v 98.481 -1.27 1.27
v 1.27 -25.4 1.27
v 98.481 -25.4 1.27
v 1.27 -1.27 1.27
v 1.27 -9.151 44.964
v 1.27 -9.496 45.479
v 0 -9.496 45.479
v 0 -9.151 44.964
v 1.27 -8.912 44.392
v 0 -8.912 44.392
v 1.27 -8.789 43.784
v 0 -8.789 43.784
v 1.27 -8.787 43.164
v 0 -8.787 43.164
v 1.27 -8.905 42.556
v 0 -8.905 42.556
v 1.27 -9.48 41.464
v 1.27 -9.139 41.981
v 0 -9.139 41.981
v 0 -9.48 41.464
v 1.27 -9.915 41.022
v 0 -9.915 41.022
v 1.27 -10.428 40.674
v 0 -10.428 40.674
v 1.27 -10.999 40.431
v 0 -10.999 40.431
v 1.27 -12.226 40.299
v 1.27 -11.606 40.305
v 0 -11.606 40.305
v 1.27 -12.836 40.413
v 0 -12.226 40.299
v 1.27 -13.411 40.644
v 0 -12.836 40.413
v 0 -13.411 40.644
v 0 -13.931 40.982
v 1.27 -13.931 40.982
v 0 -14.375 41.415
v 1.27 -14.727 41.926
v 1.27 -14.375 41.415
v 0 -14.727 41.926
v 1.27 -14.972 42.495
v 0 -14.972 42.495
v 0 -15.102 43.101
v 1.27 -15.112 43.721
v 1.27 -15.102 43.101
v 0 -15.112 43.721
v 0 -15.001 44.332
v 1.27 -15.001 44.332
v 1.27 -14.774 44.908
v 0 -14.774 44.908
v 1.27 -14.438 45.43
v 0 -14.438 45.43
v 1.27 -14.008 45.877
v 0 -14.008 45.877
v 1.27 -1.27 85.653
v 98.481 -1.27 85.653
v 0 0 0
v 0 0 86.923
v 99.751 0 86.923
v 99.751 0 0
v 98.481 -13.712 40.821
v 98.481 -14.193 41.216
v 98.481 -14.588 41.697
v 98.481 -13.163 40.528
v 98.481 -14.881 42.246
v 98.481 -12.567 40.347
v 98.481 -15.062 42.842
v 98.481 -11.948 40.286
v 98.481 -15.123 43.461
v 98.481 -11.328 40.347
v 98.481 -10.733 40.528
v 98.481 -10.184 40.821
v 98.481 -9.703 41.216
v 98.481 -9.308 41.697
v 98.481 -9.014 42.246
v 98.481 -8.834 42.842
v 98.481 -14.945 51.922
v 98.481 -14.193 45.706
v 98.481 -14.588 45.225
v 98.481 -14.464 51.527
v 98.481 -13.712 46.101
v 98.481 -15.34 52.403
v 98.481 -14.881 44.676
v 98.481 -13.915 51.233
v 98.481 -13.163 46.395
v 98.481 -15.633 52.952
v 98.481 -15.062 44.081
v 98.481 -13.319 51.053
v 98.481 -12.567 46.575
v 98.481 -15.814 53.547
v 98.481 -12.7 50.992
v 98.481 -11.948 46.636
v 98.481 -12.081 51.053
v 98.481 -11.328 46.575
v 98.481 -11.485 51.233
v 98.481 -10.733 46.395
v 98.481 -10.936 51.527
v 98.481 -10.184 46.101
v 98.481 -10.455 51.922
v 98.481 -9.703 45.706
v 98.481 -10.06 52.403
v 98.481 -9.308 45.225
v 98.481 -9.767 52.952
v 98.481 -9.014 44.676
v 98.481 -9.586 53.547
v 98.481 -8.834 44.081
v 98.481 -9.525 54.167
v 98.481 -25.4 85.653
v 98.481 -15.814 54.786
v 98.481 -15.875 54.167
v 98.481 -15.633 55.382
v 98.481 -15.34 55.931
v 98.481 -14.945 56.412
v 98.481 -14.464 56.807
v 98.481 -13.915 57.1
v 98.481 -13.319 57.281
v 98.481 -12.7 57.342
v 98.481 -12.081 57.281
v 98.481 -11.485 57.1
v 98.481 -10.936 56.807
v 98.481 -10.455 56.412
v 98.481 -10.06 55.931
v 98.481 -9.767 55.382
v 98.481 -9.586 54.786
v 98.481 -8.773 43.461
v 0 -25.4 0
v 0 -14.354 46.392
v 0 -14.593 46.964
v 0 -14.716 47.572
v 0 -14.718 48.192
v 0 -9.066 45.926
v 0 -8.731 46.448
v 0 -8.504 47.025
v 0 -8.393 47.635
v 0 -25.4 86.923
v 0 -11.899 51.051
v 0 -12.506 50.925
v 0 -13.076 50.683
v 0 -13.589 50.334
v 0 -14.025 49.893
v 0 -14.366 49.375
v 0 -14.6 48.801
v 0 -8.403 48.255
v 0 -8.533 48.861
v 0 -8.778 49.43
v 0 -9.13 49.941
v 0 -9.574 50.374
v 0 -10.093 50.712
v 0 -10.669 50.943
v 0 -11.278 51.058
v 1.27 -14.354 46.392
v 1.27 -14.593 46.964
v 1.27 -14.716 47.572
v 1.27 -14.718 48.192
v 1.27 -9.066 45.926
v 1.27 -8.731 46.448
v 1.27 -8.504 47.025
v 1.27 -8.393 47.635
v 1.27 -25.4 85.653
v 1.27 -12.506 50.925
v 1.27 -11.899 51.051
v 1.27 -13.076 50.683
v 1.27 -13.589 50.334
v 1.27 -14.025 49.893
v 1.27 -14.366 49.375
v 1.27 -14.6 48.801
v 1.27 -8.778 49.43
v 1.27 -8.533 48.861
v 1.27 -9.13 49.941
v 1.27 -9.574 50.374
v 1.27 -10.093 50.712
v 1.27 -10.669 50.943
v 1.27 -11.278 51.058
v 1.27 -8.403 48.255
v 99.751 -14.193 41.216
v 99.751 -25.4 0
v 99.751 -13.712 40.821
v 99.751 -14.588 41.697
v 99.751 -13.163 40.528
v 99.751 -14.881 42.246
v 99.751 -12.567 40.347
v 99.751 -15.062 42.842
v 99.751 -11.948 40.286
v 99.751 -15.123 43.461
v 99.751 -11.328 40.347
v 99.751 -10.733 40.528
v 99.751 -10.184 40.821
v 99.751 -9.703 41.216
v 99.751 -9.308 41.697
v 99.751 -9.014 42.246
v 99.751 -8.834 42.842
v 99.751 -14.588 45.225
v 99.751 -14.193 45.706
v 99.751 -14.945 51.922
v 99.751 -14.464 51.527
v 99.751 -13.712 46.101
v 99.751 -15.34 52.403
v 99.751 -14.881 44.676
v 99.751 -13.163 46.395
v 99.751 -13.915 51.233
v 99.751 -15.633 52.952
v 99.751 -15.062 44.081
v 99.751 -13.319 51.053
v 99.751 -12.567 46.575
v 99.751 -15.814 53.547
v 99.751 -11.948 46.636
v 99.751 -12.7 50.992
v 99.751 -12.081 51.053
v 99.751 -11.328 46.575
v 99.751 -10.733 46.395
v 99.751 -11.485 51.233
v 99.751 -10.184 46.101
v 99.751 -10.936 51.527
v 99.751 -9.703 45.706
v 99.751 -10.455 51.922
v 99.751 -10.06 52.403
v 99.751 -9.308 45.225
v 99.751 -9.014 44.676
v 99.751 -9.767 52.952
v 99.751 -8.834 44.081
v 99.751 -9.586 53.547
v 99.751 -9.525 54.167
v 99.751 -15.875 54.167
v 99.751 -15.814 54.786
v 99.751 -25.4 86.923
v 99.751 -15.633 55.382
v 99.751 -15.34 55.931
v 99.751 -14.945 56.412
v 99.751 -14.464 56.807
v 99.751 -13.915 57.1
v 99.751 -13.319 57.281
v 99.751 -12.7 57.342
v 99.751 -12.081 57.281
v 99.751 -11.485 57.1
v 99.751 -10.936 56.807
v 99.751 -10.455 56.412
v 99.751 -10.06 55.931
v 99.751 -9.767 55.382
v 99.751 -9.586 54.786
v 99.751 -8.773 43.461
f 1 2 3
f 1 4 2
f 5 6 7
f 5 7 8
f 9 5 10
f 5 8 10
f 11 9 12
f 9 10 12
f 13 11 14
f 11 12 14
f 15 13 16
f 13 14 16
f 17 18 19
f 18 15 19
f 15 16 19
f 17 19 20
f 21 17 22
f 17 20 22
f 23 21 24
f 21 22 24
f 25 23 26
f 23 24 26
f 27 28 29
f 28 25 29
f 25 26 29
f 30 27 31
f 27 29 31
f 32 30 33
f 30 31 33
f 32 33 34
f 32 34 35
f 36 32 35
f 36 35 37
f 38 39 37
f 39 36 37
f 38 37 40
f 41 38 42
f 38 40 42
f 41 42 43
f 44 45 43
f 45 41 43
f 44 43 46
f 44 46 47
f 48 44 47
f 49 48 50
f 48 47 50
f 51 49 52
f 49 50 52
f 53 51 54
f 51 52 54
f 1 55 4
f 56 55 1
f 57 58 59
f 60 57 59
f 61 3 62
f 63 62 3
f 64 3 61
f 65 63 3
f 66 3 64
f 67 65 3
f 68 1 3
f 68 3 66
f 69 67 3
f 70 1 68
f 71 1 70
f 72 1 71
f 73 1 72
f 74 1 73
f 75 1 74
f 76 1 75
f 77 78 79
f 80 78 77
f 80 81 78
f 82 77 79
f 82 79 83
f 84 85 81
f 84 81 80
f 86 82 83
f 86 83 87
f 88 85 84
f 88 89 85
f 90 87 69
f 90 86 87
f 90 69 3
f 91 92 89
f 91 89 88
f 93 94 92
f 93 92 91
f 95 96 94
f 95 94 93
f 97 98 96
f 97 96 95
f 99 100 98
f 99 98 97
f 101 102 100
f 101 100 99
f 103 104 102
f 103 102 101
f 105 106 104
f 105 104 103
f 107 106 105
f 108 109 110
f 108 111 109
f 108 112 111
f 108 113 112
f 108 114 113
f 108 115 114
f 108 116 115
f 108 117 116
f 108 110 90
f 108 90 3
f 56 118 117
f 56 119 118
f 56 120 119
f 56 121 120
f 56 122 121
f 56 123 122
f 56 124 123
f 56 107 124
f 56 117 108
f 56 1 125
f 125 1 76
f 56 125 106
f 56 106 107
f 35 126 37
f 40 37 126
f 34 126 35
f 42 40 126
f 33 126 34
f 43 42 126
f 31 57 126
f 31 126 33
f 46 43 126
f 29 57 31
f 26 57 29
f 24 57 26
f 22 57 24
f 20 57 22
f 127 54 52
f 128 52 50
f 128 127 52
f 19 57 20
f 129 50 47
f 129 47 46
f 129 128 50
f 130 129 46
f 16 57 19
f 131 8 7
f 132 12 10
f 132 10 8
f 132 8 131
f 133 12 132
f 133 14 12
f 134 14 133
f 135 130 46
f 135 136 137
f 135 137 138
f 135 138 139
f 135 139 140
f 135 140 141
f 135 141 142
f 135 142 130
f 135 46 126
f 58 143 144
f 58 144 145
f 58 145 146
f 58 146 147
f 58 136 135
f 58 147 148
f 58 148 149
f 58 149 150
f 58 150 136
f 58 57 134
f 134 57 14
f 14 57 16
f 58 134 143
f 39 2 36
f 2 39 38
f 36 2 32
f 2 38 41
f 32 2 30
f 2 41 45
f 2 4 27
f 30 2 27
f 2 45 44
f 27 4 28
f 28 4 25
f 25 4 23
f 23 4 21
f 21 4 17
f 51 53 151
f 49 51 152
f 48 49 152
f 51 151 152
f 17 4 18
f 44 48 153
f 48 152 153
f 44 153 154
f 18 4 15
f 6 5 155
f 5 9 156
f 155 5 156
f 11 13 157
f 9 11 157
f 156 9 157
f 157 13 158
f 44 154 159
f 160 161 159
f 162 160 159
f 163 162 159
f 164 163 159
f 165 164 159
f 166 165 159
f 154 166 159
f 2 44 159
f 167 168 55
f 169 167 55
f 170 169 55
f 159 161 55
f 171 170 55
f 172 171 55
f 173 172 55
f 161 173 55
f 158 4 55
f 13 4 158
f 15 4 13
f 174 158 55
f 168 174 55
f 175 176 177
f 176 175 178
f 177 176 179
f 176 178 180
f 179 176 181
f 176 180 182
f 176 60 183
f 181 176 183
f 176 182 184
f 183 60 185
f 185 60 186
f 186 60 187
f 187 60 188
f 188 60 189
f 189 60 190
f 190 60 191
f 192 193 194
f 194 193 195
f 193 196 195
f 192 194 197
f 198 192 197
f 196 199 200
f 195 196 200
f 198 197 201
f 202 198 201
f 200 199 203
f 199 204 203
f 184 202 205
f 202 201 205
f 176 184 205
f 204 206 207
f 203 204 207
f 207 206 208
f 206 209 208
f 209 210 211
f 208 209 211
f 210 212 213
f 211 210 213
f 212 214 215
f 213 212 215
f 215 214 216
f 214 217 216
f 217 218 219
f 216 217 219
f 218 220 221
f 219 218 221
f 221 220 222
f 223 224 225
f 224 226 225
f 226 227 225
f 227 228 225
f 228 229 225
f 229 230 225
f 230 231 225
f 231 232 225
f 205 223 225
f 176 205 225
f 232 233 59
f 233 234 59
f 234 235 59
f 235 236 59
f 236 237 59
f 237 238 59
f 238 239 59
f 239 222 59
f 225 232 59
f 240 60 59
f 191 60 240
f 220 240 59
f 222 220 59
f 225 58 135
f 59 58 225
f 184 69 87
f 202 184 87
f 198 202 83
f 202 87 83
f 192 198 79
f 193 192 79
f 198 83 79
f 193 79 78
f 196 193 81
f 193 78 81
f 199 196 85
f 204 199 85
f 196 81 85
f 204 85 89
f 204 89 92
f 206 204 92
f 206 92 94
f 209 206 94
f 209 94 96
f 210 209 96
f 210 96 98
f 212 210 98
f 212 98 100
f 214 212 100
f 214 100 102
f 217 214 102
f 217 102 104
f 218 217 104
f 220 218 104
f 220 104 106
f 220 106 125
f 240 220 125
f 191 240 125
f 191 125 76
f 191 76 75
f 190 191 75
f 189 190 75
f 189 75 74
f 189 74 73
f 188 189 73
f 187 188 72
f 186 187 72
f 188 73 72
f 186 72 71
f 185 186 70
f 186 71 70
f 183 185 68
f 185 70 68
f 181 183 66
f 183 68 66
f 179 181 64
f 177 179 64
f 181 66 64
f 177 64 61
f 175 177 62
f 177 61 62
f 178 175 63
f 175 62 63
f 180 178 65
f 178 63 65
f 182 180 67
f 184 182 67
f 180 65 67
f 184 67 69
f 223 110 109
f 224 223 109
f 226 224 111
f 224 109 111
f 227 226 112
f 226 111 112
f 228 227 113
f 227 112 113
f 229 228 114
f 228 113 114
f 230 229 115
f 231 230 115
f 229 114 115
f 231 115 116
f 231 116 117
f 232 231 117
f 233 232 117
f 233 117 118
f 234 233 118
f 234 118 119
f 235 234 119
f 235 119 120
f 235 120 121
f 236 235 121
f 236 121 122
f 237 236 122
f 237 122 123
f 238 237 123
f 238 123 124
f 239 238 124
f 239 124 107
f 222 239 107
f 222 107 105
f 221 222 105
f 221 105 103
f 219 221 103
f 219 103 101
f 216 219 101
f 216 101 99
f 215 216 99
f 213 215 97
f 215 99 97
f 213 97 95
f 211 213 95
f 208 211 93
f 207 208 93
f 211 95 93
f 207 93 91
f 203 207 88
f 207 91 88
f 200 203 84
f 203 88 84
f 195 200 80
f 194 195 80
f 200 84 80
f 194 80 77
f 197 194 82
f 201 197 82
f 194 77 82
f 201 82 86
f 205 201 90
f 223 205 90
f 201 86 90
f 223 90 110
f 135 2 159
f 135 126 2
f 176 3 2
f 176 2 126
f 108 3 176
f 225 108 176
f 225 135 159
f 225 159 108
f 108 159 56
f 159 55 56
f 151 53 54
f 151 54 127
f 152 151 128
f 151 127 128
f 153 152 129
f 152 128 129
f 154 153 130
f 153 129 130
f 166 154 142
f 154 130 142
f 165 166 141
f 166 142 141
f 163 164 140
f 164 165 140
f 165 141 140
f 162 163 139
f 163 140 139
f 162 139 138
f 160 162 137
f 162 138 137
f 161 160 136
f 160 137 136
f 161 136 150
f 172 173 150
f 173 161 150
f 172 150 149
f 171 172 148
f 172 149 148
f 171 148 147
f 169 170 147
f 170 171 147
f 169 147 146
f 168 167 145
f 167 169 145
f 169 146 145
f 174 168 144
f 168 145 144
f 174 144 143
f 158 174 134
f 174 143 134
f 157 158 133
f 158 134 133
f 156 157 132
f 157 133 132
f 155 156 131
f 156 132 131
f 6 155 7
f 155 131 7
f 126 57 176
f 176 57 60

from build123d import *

# Parameters (mm, degrees)
F0_W     = 99.75113
F0_H     = 86.922713
F1_DEPTH = 25.4
F2_T     = -1.27
F4_D     = 6.35
F6_D     = 6.35
F6_DEPTH = 12.7
F8_D     = 6.35
F8_DEPTH = 12.7


with BuildPart() as f1:
    # F0 (on Front) → F1 (new body)
    with BuildSketch(Plane.XZ):
        with Locations((49.875565, 43.461357)):
            Rectangle(F0_W, F0_H)
    extrude(amount=F1_DEPTH)

    # F2
    f2_openings = [f1.faces().sort_by_distance(p)[0] for p in [
        (49.875565, -25.4, 43.461356),
    ]]
    offset(amount=F2_T, openings=f2_openings)

    # F4 (through all)
    with Locations(Plane.YZ.offset(99.75113)):
        with Locations((-11.947631, 43.461356)):
            Hole(F4_D / 2)

    # F6
    with Locations(Plane.YZ.offset(1.27)):
        with Locations((-11.557093, 47.894768)):
            Hole(F6_D / 2, depth=F6_DEPTH)

    # F8
    with Locations(Plane.YZ.offset(99.75113)):
        with Locations((-12.7, 54.16663)):
            Hole(F8_D / 2, depth=F8_DEPTH)


solid = f1.part
